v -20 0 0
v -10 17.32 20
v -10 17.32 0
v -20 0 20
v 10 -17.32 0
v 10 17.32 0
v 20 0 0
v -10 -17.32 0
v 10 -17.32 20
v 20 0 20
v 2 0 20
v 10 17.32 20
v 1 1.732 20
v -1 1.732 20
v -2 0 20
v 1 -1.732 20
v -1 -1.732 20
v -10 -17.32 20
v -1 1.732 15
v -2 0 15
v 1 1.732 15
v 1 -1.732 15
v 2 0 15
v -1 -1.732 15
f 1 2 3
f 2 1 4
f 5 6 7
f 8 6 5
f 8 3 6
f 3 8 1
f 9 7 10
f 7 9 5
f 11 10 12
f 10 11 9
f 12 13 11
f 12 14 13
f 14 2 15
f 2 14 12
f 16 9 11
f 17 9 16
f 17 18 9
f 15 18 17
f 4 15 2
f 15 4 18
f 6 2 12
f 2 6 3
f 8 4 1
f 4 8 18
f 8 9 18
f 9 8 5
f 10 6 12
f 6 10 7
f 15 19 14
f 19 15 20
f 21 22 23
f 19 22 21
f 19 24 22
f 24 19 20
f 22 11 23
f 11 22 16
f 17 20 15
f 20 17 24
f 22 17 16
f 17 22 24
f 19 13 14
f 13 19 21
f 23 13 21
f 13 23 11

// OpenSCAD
// (in millimeters)
sideWidth = 20; 
baseHeight = 20;
reservoirDepth = 5;
reservoirOffset = baseHeight - reservoirDepth;
reservoirWidth = 2;
// hexagon computations
diameter = 2 * sideWidth;
minimalRadius = cos(30) * sideWidth;
perimeter = 6 * sideWidth;
area = (minimalRadius * perimeter) / 2;

// Draw
difference() {
linear_extrude(height = baseHeight, convexity = 10, twist = 0)
    translate([0,0]) polygonWithArea(6, sideWidth);
 reservoir();
}

// One shape with corresponding text
module polygonWithArea(points, r) {
    polygon(ngon(points, r));
}

// List comprehension for creating N-gon vertices
function ngon(num, r) = 
  [for (i=[0:num-1], a=i*360/num) [ r*cos(a), r*sin(a) ]];

// reservoirs
module reservoir() {
    translate([0,0, reservoirOffset]) linear_extrude(height = baseHeight, convexity = 10, twist = 0) polygonWithArea(6, reservoirWidth);
}
  
// function to compute coordinate pairs for reservoirs (hexagon base only)

// twist lock - "Principles of Interlocking"
  
// stand
  
// evaporation computation
  
// size computations
